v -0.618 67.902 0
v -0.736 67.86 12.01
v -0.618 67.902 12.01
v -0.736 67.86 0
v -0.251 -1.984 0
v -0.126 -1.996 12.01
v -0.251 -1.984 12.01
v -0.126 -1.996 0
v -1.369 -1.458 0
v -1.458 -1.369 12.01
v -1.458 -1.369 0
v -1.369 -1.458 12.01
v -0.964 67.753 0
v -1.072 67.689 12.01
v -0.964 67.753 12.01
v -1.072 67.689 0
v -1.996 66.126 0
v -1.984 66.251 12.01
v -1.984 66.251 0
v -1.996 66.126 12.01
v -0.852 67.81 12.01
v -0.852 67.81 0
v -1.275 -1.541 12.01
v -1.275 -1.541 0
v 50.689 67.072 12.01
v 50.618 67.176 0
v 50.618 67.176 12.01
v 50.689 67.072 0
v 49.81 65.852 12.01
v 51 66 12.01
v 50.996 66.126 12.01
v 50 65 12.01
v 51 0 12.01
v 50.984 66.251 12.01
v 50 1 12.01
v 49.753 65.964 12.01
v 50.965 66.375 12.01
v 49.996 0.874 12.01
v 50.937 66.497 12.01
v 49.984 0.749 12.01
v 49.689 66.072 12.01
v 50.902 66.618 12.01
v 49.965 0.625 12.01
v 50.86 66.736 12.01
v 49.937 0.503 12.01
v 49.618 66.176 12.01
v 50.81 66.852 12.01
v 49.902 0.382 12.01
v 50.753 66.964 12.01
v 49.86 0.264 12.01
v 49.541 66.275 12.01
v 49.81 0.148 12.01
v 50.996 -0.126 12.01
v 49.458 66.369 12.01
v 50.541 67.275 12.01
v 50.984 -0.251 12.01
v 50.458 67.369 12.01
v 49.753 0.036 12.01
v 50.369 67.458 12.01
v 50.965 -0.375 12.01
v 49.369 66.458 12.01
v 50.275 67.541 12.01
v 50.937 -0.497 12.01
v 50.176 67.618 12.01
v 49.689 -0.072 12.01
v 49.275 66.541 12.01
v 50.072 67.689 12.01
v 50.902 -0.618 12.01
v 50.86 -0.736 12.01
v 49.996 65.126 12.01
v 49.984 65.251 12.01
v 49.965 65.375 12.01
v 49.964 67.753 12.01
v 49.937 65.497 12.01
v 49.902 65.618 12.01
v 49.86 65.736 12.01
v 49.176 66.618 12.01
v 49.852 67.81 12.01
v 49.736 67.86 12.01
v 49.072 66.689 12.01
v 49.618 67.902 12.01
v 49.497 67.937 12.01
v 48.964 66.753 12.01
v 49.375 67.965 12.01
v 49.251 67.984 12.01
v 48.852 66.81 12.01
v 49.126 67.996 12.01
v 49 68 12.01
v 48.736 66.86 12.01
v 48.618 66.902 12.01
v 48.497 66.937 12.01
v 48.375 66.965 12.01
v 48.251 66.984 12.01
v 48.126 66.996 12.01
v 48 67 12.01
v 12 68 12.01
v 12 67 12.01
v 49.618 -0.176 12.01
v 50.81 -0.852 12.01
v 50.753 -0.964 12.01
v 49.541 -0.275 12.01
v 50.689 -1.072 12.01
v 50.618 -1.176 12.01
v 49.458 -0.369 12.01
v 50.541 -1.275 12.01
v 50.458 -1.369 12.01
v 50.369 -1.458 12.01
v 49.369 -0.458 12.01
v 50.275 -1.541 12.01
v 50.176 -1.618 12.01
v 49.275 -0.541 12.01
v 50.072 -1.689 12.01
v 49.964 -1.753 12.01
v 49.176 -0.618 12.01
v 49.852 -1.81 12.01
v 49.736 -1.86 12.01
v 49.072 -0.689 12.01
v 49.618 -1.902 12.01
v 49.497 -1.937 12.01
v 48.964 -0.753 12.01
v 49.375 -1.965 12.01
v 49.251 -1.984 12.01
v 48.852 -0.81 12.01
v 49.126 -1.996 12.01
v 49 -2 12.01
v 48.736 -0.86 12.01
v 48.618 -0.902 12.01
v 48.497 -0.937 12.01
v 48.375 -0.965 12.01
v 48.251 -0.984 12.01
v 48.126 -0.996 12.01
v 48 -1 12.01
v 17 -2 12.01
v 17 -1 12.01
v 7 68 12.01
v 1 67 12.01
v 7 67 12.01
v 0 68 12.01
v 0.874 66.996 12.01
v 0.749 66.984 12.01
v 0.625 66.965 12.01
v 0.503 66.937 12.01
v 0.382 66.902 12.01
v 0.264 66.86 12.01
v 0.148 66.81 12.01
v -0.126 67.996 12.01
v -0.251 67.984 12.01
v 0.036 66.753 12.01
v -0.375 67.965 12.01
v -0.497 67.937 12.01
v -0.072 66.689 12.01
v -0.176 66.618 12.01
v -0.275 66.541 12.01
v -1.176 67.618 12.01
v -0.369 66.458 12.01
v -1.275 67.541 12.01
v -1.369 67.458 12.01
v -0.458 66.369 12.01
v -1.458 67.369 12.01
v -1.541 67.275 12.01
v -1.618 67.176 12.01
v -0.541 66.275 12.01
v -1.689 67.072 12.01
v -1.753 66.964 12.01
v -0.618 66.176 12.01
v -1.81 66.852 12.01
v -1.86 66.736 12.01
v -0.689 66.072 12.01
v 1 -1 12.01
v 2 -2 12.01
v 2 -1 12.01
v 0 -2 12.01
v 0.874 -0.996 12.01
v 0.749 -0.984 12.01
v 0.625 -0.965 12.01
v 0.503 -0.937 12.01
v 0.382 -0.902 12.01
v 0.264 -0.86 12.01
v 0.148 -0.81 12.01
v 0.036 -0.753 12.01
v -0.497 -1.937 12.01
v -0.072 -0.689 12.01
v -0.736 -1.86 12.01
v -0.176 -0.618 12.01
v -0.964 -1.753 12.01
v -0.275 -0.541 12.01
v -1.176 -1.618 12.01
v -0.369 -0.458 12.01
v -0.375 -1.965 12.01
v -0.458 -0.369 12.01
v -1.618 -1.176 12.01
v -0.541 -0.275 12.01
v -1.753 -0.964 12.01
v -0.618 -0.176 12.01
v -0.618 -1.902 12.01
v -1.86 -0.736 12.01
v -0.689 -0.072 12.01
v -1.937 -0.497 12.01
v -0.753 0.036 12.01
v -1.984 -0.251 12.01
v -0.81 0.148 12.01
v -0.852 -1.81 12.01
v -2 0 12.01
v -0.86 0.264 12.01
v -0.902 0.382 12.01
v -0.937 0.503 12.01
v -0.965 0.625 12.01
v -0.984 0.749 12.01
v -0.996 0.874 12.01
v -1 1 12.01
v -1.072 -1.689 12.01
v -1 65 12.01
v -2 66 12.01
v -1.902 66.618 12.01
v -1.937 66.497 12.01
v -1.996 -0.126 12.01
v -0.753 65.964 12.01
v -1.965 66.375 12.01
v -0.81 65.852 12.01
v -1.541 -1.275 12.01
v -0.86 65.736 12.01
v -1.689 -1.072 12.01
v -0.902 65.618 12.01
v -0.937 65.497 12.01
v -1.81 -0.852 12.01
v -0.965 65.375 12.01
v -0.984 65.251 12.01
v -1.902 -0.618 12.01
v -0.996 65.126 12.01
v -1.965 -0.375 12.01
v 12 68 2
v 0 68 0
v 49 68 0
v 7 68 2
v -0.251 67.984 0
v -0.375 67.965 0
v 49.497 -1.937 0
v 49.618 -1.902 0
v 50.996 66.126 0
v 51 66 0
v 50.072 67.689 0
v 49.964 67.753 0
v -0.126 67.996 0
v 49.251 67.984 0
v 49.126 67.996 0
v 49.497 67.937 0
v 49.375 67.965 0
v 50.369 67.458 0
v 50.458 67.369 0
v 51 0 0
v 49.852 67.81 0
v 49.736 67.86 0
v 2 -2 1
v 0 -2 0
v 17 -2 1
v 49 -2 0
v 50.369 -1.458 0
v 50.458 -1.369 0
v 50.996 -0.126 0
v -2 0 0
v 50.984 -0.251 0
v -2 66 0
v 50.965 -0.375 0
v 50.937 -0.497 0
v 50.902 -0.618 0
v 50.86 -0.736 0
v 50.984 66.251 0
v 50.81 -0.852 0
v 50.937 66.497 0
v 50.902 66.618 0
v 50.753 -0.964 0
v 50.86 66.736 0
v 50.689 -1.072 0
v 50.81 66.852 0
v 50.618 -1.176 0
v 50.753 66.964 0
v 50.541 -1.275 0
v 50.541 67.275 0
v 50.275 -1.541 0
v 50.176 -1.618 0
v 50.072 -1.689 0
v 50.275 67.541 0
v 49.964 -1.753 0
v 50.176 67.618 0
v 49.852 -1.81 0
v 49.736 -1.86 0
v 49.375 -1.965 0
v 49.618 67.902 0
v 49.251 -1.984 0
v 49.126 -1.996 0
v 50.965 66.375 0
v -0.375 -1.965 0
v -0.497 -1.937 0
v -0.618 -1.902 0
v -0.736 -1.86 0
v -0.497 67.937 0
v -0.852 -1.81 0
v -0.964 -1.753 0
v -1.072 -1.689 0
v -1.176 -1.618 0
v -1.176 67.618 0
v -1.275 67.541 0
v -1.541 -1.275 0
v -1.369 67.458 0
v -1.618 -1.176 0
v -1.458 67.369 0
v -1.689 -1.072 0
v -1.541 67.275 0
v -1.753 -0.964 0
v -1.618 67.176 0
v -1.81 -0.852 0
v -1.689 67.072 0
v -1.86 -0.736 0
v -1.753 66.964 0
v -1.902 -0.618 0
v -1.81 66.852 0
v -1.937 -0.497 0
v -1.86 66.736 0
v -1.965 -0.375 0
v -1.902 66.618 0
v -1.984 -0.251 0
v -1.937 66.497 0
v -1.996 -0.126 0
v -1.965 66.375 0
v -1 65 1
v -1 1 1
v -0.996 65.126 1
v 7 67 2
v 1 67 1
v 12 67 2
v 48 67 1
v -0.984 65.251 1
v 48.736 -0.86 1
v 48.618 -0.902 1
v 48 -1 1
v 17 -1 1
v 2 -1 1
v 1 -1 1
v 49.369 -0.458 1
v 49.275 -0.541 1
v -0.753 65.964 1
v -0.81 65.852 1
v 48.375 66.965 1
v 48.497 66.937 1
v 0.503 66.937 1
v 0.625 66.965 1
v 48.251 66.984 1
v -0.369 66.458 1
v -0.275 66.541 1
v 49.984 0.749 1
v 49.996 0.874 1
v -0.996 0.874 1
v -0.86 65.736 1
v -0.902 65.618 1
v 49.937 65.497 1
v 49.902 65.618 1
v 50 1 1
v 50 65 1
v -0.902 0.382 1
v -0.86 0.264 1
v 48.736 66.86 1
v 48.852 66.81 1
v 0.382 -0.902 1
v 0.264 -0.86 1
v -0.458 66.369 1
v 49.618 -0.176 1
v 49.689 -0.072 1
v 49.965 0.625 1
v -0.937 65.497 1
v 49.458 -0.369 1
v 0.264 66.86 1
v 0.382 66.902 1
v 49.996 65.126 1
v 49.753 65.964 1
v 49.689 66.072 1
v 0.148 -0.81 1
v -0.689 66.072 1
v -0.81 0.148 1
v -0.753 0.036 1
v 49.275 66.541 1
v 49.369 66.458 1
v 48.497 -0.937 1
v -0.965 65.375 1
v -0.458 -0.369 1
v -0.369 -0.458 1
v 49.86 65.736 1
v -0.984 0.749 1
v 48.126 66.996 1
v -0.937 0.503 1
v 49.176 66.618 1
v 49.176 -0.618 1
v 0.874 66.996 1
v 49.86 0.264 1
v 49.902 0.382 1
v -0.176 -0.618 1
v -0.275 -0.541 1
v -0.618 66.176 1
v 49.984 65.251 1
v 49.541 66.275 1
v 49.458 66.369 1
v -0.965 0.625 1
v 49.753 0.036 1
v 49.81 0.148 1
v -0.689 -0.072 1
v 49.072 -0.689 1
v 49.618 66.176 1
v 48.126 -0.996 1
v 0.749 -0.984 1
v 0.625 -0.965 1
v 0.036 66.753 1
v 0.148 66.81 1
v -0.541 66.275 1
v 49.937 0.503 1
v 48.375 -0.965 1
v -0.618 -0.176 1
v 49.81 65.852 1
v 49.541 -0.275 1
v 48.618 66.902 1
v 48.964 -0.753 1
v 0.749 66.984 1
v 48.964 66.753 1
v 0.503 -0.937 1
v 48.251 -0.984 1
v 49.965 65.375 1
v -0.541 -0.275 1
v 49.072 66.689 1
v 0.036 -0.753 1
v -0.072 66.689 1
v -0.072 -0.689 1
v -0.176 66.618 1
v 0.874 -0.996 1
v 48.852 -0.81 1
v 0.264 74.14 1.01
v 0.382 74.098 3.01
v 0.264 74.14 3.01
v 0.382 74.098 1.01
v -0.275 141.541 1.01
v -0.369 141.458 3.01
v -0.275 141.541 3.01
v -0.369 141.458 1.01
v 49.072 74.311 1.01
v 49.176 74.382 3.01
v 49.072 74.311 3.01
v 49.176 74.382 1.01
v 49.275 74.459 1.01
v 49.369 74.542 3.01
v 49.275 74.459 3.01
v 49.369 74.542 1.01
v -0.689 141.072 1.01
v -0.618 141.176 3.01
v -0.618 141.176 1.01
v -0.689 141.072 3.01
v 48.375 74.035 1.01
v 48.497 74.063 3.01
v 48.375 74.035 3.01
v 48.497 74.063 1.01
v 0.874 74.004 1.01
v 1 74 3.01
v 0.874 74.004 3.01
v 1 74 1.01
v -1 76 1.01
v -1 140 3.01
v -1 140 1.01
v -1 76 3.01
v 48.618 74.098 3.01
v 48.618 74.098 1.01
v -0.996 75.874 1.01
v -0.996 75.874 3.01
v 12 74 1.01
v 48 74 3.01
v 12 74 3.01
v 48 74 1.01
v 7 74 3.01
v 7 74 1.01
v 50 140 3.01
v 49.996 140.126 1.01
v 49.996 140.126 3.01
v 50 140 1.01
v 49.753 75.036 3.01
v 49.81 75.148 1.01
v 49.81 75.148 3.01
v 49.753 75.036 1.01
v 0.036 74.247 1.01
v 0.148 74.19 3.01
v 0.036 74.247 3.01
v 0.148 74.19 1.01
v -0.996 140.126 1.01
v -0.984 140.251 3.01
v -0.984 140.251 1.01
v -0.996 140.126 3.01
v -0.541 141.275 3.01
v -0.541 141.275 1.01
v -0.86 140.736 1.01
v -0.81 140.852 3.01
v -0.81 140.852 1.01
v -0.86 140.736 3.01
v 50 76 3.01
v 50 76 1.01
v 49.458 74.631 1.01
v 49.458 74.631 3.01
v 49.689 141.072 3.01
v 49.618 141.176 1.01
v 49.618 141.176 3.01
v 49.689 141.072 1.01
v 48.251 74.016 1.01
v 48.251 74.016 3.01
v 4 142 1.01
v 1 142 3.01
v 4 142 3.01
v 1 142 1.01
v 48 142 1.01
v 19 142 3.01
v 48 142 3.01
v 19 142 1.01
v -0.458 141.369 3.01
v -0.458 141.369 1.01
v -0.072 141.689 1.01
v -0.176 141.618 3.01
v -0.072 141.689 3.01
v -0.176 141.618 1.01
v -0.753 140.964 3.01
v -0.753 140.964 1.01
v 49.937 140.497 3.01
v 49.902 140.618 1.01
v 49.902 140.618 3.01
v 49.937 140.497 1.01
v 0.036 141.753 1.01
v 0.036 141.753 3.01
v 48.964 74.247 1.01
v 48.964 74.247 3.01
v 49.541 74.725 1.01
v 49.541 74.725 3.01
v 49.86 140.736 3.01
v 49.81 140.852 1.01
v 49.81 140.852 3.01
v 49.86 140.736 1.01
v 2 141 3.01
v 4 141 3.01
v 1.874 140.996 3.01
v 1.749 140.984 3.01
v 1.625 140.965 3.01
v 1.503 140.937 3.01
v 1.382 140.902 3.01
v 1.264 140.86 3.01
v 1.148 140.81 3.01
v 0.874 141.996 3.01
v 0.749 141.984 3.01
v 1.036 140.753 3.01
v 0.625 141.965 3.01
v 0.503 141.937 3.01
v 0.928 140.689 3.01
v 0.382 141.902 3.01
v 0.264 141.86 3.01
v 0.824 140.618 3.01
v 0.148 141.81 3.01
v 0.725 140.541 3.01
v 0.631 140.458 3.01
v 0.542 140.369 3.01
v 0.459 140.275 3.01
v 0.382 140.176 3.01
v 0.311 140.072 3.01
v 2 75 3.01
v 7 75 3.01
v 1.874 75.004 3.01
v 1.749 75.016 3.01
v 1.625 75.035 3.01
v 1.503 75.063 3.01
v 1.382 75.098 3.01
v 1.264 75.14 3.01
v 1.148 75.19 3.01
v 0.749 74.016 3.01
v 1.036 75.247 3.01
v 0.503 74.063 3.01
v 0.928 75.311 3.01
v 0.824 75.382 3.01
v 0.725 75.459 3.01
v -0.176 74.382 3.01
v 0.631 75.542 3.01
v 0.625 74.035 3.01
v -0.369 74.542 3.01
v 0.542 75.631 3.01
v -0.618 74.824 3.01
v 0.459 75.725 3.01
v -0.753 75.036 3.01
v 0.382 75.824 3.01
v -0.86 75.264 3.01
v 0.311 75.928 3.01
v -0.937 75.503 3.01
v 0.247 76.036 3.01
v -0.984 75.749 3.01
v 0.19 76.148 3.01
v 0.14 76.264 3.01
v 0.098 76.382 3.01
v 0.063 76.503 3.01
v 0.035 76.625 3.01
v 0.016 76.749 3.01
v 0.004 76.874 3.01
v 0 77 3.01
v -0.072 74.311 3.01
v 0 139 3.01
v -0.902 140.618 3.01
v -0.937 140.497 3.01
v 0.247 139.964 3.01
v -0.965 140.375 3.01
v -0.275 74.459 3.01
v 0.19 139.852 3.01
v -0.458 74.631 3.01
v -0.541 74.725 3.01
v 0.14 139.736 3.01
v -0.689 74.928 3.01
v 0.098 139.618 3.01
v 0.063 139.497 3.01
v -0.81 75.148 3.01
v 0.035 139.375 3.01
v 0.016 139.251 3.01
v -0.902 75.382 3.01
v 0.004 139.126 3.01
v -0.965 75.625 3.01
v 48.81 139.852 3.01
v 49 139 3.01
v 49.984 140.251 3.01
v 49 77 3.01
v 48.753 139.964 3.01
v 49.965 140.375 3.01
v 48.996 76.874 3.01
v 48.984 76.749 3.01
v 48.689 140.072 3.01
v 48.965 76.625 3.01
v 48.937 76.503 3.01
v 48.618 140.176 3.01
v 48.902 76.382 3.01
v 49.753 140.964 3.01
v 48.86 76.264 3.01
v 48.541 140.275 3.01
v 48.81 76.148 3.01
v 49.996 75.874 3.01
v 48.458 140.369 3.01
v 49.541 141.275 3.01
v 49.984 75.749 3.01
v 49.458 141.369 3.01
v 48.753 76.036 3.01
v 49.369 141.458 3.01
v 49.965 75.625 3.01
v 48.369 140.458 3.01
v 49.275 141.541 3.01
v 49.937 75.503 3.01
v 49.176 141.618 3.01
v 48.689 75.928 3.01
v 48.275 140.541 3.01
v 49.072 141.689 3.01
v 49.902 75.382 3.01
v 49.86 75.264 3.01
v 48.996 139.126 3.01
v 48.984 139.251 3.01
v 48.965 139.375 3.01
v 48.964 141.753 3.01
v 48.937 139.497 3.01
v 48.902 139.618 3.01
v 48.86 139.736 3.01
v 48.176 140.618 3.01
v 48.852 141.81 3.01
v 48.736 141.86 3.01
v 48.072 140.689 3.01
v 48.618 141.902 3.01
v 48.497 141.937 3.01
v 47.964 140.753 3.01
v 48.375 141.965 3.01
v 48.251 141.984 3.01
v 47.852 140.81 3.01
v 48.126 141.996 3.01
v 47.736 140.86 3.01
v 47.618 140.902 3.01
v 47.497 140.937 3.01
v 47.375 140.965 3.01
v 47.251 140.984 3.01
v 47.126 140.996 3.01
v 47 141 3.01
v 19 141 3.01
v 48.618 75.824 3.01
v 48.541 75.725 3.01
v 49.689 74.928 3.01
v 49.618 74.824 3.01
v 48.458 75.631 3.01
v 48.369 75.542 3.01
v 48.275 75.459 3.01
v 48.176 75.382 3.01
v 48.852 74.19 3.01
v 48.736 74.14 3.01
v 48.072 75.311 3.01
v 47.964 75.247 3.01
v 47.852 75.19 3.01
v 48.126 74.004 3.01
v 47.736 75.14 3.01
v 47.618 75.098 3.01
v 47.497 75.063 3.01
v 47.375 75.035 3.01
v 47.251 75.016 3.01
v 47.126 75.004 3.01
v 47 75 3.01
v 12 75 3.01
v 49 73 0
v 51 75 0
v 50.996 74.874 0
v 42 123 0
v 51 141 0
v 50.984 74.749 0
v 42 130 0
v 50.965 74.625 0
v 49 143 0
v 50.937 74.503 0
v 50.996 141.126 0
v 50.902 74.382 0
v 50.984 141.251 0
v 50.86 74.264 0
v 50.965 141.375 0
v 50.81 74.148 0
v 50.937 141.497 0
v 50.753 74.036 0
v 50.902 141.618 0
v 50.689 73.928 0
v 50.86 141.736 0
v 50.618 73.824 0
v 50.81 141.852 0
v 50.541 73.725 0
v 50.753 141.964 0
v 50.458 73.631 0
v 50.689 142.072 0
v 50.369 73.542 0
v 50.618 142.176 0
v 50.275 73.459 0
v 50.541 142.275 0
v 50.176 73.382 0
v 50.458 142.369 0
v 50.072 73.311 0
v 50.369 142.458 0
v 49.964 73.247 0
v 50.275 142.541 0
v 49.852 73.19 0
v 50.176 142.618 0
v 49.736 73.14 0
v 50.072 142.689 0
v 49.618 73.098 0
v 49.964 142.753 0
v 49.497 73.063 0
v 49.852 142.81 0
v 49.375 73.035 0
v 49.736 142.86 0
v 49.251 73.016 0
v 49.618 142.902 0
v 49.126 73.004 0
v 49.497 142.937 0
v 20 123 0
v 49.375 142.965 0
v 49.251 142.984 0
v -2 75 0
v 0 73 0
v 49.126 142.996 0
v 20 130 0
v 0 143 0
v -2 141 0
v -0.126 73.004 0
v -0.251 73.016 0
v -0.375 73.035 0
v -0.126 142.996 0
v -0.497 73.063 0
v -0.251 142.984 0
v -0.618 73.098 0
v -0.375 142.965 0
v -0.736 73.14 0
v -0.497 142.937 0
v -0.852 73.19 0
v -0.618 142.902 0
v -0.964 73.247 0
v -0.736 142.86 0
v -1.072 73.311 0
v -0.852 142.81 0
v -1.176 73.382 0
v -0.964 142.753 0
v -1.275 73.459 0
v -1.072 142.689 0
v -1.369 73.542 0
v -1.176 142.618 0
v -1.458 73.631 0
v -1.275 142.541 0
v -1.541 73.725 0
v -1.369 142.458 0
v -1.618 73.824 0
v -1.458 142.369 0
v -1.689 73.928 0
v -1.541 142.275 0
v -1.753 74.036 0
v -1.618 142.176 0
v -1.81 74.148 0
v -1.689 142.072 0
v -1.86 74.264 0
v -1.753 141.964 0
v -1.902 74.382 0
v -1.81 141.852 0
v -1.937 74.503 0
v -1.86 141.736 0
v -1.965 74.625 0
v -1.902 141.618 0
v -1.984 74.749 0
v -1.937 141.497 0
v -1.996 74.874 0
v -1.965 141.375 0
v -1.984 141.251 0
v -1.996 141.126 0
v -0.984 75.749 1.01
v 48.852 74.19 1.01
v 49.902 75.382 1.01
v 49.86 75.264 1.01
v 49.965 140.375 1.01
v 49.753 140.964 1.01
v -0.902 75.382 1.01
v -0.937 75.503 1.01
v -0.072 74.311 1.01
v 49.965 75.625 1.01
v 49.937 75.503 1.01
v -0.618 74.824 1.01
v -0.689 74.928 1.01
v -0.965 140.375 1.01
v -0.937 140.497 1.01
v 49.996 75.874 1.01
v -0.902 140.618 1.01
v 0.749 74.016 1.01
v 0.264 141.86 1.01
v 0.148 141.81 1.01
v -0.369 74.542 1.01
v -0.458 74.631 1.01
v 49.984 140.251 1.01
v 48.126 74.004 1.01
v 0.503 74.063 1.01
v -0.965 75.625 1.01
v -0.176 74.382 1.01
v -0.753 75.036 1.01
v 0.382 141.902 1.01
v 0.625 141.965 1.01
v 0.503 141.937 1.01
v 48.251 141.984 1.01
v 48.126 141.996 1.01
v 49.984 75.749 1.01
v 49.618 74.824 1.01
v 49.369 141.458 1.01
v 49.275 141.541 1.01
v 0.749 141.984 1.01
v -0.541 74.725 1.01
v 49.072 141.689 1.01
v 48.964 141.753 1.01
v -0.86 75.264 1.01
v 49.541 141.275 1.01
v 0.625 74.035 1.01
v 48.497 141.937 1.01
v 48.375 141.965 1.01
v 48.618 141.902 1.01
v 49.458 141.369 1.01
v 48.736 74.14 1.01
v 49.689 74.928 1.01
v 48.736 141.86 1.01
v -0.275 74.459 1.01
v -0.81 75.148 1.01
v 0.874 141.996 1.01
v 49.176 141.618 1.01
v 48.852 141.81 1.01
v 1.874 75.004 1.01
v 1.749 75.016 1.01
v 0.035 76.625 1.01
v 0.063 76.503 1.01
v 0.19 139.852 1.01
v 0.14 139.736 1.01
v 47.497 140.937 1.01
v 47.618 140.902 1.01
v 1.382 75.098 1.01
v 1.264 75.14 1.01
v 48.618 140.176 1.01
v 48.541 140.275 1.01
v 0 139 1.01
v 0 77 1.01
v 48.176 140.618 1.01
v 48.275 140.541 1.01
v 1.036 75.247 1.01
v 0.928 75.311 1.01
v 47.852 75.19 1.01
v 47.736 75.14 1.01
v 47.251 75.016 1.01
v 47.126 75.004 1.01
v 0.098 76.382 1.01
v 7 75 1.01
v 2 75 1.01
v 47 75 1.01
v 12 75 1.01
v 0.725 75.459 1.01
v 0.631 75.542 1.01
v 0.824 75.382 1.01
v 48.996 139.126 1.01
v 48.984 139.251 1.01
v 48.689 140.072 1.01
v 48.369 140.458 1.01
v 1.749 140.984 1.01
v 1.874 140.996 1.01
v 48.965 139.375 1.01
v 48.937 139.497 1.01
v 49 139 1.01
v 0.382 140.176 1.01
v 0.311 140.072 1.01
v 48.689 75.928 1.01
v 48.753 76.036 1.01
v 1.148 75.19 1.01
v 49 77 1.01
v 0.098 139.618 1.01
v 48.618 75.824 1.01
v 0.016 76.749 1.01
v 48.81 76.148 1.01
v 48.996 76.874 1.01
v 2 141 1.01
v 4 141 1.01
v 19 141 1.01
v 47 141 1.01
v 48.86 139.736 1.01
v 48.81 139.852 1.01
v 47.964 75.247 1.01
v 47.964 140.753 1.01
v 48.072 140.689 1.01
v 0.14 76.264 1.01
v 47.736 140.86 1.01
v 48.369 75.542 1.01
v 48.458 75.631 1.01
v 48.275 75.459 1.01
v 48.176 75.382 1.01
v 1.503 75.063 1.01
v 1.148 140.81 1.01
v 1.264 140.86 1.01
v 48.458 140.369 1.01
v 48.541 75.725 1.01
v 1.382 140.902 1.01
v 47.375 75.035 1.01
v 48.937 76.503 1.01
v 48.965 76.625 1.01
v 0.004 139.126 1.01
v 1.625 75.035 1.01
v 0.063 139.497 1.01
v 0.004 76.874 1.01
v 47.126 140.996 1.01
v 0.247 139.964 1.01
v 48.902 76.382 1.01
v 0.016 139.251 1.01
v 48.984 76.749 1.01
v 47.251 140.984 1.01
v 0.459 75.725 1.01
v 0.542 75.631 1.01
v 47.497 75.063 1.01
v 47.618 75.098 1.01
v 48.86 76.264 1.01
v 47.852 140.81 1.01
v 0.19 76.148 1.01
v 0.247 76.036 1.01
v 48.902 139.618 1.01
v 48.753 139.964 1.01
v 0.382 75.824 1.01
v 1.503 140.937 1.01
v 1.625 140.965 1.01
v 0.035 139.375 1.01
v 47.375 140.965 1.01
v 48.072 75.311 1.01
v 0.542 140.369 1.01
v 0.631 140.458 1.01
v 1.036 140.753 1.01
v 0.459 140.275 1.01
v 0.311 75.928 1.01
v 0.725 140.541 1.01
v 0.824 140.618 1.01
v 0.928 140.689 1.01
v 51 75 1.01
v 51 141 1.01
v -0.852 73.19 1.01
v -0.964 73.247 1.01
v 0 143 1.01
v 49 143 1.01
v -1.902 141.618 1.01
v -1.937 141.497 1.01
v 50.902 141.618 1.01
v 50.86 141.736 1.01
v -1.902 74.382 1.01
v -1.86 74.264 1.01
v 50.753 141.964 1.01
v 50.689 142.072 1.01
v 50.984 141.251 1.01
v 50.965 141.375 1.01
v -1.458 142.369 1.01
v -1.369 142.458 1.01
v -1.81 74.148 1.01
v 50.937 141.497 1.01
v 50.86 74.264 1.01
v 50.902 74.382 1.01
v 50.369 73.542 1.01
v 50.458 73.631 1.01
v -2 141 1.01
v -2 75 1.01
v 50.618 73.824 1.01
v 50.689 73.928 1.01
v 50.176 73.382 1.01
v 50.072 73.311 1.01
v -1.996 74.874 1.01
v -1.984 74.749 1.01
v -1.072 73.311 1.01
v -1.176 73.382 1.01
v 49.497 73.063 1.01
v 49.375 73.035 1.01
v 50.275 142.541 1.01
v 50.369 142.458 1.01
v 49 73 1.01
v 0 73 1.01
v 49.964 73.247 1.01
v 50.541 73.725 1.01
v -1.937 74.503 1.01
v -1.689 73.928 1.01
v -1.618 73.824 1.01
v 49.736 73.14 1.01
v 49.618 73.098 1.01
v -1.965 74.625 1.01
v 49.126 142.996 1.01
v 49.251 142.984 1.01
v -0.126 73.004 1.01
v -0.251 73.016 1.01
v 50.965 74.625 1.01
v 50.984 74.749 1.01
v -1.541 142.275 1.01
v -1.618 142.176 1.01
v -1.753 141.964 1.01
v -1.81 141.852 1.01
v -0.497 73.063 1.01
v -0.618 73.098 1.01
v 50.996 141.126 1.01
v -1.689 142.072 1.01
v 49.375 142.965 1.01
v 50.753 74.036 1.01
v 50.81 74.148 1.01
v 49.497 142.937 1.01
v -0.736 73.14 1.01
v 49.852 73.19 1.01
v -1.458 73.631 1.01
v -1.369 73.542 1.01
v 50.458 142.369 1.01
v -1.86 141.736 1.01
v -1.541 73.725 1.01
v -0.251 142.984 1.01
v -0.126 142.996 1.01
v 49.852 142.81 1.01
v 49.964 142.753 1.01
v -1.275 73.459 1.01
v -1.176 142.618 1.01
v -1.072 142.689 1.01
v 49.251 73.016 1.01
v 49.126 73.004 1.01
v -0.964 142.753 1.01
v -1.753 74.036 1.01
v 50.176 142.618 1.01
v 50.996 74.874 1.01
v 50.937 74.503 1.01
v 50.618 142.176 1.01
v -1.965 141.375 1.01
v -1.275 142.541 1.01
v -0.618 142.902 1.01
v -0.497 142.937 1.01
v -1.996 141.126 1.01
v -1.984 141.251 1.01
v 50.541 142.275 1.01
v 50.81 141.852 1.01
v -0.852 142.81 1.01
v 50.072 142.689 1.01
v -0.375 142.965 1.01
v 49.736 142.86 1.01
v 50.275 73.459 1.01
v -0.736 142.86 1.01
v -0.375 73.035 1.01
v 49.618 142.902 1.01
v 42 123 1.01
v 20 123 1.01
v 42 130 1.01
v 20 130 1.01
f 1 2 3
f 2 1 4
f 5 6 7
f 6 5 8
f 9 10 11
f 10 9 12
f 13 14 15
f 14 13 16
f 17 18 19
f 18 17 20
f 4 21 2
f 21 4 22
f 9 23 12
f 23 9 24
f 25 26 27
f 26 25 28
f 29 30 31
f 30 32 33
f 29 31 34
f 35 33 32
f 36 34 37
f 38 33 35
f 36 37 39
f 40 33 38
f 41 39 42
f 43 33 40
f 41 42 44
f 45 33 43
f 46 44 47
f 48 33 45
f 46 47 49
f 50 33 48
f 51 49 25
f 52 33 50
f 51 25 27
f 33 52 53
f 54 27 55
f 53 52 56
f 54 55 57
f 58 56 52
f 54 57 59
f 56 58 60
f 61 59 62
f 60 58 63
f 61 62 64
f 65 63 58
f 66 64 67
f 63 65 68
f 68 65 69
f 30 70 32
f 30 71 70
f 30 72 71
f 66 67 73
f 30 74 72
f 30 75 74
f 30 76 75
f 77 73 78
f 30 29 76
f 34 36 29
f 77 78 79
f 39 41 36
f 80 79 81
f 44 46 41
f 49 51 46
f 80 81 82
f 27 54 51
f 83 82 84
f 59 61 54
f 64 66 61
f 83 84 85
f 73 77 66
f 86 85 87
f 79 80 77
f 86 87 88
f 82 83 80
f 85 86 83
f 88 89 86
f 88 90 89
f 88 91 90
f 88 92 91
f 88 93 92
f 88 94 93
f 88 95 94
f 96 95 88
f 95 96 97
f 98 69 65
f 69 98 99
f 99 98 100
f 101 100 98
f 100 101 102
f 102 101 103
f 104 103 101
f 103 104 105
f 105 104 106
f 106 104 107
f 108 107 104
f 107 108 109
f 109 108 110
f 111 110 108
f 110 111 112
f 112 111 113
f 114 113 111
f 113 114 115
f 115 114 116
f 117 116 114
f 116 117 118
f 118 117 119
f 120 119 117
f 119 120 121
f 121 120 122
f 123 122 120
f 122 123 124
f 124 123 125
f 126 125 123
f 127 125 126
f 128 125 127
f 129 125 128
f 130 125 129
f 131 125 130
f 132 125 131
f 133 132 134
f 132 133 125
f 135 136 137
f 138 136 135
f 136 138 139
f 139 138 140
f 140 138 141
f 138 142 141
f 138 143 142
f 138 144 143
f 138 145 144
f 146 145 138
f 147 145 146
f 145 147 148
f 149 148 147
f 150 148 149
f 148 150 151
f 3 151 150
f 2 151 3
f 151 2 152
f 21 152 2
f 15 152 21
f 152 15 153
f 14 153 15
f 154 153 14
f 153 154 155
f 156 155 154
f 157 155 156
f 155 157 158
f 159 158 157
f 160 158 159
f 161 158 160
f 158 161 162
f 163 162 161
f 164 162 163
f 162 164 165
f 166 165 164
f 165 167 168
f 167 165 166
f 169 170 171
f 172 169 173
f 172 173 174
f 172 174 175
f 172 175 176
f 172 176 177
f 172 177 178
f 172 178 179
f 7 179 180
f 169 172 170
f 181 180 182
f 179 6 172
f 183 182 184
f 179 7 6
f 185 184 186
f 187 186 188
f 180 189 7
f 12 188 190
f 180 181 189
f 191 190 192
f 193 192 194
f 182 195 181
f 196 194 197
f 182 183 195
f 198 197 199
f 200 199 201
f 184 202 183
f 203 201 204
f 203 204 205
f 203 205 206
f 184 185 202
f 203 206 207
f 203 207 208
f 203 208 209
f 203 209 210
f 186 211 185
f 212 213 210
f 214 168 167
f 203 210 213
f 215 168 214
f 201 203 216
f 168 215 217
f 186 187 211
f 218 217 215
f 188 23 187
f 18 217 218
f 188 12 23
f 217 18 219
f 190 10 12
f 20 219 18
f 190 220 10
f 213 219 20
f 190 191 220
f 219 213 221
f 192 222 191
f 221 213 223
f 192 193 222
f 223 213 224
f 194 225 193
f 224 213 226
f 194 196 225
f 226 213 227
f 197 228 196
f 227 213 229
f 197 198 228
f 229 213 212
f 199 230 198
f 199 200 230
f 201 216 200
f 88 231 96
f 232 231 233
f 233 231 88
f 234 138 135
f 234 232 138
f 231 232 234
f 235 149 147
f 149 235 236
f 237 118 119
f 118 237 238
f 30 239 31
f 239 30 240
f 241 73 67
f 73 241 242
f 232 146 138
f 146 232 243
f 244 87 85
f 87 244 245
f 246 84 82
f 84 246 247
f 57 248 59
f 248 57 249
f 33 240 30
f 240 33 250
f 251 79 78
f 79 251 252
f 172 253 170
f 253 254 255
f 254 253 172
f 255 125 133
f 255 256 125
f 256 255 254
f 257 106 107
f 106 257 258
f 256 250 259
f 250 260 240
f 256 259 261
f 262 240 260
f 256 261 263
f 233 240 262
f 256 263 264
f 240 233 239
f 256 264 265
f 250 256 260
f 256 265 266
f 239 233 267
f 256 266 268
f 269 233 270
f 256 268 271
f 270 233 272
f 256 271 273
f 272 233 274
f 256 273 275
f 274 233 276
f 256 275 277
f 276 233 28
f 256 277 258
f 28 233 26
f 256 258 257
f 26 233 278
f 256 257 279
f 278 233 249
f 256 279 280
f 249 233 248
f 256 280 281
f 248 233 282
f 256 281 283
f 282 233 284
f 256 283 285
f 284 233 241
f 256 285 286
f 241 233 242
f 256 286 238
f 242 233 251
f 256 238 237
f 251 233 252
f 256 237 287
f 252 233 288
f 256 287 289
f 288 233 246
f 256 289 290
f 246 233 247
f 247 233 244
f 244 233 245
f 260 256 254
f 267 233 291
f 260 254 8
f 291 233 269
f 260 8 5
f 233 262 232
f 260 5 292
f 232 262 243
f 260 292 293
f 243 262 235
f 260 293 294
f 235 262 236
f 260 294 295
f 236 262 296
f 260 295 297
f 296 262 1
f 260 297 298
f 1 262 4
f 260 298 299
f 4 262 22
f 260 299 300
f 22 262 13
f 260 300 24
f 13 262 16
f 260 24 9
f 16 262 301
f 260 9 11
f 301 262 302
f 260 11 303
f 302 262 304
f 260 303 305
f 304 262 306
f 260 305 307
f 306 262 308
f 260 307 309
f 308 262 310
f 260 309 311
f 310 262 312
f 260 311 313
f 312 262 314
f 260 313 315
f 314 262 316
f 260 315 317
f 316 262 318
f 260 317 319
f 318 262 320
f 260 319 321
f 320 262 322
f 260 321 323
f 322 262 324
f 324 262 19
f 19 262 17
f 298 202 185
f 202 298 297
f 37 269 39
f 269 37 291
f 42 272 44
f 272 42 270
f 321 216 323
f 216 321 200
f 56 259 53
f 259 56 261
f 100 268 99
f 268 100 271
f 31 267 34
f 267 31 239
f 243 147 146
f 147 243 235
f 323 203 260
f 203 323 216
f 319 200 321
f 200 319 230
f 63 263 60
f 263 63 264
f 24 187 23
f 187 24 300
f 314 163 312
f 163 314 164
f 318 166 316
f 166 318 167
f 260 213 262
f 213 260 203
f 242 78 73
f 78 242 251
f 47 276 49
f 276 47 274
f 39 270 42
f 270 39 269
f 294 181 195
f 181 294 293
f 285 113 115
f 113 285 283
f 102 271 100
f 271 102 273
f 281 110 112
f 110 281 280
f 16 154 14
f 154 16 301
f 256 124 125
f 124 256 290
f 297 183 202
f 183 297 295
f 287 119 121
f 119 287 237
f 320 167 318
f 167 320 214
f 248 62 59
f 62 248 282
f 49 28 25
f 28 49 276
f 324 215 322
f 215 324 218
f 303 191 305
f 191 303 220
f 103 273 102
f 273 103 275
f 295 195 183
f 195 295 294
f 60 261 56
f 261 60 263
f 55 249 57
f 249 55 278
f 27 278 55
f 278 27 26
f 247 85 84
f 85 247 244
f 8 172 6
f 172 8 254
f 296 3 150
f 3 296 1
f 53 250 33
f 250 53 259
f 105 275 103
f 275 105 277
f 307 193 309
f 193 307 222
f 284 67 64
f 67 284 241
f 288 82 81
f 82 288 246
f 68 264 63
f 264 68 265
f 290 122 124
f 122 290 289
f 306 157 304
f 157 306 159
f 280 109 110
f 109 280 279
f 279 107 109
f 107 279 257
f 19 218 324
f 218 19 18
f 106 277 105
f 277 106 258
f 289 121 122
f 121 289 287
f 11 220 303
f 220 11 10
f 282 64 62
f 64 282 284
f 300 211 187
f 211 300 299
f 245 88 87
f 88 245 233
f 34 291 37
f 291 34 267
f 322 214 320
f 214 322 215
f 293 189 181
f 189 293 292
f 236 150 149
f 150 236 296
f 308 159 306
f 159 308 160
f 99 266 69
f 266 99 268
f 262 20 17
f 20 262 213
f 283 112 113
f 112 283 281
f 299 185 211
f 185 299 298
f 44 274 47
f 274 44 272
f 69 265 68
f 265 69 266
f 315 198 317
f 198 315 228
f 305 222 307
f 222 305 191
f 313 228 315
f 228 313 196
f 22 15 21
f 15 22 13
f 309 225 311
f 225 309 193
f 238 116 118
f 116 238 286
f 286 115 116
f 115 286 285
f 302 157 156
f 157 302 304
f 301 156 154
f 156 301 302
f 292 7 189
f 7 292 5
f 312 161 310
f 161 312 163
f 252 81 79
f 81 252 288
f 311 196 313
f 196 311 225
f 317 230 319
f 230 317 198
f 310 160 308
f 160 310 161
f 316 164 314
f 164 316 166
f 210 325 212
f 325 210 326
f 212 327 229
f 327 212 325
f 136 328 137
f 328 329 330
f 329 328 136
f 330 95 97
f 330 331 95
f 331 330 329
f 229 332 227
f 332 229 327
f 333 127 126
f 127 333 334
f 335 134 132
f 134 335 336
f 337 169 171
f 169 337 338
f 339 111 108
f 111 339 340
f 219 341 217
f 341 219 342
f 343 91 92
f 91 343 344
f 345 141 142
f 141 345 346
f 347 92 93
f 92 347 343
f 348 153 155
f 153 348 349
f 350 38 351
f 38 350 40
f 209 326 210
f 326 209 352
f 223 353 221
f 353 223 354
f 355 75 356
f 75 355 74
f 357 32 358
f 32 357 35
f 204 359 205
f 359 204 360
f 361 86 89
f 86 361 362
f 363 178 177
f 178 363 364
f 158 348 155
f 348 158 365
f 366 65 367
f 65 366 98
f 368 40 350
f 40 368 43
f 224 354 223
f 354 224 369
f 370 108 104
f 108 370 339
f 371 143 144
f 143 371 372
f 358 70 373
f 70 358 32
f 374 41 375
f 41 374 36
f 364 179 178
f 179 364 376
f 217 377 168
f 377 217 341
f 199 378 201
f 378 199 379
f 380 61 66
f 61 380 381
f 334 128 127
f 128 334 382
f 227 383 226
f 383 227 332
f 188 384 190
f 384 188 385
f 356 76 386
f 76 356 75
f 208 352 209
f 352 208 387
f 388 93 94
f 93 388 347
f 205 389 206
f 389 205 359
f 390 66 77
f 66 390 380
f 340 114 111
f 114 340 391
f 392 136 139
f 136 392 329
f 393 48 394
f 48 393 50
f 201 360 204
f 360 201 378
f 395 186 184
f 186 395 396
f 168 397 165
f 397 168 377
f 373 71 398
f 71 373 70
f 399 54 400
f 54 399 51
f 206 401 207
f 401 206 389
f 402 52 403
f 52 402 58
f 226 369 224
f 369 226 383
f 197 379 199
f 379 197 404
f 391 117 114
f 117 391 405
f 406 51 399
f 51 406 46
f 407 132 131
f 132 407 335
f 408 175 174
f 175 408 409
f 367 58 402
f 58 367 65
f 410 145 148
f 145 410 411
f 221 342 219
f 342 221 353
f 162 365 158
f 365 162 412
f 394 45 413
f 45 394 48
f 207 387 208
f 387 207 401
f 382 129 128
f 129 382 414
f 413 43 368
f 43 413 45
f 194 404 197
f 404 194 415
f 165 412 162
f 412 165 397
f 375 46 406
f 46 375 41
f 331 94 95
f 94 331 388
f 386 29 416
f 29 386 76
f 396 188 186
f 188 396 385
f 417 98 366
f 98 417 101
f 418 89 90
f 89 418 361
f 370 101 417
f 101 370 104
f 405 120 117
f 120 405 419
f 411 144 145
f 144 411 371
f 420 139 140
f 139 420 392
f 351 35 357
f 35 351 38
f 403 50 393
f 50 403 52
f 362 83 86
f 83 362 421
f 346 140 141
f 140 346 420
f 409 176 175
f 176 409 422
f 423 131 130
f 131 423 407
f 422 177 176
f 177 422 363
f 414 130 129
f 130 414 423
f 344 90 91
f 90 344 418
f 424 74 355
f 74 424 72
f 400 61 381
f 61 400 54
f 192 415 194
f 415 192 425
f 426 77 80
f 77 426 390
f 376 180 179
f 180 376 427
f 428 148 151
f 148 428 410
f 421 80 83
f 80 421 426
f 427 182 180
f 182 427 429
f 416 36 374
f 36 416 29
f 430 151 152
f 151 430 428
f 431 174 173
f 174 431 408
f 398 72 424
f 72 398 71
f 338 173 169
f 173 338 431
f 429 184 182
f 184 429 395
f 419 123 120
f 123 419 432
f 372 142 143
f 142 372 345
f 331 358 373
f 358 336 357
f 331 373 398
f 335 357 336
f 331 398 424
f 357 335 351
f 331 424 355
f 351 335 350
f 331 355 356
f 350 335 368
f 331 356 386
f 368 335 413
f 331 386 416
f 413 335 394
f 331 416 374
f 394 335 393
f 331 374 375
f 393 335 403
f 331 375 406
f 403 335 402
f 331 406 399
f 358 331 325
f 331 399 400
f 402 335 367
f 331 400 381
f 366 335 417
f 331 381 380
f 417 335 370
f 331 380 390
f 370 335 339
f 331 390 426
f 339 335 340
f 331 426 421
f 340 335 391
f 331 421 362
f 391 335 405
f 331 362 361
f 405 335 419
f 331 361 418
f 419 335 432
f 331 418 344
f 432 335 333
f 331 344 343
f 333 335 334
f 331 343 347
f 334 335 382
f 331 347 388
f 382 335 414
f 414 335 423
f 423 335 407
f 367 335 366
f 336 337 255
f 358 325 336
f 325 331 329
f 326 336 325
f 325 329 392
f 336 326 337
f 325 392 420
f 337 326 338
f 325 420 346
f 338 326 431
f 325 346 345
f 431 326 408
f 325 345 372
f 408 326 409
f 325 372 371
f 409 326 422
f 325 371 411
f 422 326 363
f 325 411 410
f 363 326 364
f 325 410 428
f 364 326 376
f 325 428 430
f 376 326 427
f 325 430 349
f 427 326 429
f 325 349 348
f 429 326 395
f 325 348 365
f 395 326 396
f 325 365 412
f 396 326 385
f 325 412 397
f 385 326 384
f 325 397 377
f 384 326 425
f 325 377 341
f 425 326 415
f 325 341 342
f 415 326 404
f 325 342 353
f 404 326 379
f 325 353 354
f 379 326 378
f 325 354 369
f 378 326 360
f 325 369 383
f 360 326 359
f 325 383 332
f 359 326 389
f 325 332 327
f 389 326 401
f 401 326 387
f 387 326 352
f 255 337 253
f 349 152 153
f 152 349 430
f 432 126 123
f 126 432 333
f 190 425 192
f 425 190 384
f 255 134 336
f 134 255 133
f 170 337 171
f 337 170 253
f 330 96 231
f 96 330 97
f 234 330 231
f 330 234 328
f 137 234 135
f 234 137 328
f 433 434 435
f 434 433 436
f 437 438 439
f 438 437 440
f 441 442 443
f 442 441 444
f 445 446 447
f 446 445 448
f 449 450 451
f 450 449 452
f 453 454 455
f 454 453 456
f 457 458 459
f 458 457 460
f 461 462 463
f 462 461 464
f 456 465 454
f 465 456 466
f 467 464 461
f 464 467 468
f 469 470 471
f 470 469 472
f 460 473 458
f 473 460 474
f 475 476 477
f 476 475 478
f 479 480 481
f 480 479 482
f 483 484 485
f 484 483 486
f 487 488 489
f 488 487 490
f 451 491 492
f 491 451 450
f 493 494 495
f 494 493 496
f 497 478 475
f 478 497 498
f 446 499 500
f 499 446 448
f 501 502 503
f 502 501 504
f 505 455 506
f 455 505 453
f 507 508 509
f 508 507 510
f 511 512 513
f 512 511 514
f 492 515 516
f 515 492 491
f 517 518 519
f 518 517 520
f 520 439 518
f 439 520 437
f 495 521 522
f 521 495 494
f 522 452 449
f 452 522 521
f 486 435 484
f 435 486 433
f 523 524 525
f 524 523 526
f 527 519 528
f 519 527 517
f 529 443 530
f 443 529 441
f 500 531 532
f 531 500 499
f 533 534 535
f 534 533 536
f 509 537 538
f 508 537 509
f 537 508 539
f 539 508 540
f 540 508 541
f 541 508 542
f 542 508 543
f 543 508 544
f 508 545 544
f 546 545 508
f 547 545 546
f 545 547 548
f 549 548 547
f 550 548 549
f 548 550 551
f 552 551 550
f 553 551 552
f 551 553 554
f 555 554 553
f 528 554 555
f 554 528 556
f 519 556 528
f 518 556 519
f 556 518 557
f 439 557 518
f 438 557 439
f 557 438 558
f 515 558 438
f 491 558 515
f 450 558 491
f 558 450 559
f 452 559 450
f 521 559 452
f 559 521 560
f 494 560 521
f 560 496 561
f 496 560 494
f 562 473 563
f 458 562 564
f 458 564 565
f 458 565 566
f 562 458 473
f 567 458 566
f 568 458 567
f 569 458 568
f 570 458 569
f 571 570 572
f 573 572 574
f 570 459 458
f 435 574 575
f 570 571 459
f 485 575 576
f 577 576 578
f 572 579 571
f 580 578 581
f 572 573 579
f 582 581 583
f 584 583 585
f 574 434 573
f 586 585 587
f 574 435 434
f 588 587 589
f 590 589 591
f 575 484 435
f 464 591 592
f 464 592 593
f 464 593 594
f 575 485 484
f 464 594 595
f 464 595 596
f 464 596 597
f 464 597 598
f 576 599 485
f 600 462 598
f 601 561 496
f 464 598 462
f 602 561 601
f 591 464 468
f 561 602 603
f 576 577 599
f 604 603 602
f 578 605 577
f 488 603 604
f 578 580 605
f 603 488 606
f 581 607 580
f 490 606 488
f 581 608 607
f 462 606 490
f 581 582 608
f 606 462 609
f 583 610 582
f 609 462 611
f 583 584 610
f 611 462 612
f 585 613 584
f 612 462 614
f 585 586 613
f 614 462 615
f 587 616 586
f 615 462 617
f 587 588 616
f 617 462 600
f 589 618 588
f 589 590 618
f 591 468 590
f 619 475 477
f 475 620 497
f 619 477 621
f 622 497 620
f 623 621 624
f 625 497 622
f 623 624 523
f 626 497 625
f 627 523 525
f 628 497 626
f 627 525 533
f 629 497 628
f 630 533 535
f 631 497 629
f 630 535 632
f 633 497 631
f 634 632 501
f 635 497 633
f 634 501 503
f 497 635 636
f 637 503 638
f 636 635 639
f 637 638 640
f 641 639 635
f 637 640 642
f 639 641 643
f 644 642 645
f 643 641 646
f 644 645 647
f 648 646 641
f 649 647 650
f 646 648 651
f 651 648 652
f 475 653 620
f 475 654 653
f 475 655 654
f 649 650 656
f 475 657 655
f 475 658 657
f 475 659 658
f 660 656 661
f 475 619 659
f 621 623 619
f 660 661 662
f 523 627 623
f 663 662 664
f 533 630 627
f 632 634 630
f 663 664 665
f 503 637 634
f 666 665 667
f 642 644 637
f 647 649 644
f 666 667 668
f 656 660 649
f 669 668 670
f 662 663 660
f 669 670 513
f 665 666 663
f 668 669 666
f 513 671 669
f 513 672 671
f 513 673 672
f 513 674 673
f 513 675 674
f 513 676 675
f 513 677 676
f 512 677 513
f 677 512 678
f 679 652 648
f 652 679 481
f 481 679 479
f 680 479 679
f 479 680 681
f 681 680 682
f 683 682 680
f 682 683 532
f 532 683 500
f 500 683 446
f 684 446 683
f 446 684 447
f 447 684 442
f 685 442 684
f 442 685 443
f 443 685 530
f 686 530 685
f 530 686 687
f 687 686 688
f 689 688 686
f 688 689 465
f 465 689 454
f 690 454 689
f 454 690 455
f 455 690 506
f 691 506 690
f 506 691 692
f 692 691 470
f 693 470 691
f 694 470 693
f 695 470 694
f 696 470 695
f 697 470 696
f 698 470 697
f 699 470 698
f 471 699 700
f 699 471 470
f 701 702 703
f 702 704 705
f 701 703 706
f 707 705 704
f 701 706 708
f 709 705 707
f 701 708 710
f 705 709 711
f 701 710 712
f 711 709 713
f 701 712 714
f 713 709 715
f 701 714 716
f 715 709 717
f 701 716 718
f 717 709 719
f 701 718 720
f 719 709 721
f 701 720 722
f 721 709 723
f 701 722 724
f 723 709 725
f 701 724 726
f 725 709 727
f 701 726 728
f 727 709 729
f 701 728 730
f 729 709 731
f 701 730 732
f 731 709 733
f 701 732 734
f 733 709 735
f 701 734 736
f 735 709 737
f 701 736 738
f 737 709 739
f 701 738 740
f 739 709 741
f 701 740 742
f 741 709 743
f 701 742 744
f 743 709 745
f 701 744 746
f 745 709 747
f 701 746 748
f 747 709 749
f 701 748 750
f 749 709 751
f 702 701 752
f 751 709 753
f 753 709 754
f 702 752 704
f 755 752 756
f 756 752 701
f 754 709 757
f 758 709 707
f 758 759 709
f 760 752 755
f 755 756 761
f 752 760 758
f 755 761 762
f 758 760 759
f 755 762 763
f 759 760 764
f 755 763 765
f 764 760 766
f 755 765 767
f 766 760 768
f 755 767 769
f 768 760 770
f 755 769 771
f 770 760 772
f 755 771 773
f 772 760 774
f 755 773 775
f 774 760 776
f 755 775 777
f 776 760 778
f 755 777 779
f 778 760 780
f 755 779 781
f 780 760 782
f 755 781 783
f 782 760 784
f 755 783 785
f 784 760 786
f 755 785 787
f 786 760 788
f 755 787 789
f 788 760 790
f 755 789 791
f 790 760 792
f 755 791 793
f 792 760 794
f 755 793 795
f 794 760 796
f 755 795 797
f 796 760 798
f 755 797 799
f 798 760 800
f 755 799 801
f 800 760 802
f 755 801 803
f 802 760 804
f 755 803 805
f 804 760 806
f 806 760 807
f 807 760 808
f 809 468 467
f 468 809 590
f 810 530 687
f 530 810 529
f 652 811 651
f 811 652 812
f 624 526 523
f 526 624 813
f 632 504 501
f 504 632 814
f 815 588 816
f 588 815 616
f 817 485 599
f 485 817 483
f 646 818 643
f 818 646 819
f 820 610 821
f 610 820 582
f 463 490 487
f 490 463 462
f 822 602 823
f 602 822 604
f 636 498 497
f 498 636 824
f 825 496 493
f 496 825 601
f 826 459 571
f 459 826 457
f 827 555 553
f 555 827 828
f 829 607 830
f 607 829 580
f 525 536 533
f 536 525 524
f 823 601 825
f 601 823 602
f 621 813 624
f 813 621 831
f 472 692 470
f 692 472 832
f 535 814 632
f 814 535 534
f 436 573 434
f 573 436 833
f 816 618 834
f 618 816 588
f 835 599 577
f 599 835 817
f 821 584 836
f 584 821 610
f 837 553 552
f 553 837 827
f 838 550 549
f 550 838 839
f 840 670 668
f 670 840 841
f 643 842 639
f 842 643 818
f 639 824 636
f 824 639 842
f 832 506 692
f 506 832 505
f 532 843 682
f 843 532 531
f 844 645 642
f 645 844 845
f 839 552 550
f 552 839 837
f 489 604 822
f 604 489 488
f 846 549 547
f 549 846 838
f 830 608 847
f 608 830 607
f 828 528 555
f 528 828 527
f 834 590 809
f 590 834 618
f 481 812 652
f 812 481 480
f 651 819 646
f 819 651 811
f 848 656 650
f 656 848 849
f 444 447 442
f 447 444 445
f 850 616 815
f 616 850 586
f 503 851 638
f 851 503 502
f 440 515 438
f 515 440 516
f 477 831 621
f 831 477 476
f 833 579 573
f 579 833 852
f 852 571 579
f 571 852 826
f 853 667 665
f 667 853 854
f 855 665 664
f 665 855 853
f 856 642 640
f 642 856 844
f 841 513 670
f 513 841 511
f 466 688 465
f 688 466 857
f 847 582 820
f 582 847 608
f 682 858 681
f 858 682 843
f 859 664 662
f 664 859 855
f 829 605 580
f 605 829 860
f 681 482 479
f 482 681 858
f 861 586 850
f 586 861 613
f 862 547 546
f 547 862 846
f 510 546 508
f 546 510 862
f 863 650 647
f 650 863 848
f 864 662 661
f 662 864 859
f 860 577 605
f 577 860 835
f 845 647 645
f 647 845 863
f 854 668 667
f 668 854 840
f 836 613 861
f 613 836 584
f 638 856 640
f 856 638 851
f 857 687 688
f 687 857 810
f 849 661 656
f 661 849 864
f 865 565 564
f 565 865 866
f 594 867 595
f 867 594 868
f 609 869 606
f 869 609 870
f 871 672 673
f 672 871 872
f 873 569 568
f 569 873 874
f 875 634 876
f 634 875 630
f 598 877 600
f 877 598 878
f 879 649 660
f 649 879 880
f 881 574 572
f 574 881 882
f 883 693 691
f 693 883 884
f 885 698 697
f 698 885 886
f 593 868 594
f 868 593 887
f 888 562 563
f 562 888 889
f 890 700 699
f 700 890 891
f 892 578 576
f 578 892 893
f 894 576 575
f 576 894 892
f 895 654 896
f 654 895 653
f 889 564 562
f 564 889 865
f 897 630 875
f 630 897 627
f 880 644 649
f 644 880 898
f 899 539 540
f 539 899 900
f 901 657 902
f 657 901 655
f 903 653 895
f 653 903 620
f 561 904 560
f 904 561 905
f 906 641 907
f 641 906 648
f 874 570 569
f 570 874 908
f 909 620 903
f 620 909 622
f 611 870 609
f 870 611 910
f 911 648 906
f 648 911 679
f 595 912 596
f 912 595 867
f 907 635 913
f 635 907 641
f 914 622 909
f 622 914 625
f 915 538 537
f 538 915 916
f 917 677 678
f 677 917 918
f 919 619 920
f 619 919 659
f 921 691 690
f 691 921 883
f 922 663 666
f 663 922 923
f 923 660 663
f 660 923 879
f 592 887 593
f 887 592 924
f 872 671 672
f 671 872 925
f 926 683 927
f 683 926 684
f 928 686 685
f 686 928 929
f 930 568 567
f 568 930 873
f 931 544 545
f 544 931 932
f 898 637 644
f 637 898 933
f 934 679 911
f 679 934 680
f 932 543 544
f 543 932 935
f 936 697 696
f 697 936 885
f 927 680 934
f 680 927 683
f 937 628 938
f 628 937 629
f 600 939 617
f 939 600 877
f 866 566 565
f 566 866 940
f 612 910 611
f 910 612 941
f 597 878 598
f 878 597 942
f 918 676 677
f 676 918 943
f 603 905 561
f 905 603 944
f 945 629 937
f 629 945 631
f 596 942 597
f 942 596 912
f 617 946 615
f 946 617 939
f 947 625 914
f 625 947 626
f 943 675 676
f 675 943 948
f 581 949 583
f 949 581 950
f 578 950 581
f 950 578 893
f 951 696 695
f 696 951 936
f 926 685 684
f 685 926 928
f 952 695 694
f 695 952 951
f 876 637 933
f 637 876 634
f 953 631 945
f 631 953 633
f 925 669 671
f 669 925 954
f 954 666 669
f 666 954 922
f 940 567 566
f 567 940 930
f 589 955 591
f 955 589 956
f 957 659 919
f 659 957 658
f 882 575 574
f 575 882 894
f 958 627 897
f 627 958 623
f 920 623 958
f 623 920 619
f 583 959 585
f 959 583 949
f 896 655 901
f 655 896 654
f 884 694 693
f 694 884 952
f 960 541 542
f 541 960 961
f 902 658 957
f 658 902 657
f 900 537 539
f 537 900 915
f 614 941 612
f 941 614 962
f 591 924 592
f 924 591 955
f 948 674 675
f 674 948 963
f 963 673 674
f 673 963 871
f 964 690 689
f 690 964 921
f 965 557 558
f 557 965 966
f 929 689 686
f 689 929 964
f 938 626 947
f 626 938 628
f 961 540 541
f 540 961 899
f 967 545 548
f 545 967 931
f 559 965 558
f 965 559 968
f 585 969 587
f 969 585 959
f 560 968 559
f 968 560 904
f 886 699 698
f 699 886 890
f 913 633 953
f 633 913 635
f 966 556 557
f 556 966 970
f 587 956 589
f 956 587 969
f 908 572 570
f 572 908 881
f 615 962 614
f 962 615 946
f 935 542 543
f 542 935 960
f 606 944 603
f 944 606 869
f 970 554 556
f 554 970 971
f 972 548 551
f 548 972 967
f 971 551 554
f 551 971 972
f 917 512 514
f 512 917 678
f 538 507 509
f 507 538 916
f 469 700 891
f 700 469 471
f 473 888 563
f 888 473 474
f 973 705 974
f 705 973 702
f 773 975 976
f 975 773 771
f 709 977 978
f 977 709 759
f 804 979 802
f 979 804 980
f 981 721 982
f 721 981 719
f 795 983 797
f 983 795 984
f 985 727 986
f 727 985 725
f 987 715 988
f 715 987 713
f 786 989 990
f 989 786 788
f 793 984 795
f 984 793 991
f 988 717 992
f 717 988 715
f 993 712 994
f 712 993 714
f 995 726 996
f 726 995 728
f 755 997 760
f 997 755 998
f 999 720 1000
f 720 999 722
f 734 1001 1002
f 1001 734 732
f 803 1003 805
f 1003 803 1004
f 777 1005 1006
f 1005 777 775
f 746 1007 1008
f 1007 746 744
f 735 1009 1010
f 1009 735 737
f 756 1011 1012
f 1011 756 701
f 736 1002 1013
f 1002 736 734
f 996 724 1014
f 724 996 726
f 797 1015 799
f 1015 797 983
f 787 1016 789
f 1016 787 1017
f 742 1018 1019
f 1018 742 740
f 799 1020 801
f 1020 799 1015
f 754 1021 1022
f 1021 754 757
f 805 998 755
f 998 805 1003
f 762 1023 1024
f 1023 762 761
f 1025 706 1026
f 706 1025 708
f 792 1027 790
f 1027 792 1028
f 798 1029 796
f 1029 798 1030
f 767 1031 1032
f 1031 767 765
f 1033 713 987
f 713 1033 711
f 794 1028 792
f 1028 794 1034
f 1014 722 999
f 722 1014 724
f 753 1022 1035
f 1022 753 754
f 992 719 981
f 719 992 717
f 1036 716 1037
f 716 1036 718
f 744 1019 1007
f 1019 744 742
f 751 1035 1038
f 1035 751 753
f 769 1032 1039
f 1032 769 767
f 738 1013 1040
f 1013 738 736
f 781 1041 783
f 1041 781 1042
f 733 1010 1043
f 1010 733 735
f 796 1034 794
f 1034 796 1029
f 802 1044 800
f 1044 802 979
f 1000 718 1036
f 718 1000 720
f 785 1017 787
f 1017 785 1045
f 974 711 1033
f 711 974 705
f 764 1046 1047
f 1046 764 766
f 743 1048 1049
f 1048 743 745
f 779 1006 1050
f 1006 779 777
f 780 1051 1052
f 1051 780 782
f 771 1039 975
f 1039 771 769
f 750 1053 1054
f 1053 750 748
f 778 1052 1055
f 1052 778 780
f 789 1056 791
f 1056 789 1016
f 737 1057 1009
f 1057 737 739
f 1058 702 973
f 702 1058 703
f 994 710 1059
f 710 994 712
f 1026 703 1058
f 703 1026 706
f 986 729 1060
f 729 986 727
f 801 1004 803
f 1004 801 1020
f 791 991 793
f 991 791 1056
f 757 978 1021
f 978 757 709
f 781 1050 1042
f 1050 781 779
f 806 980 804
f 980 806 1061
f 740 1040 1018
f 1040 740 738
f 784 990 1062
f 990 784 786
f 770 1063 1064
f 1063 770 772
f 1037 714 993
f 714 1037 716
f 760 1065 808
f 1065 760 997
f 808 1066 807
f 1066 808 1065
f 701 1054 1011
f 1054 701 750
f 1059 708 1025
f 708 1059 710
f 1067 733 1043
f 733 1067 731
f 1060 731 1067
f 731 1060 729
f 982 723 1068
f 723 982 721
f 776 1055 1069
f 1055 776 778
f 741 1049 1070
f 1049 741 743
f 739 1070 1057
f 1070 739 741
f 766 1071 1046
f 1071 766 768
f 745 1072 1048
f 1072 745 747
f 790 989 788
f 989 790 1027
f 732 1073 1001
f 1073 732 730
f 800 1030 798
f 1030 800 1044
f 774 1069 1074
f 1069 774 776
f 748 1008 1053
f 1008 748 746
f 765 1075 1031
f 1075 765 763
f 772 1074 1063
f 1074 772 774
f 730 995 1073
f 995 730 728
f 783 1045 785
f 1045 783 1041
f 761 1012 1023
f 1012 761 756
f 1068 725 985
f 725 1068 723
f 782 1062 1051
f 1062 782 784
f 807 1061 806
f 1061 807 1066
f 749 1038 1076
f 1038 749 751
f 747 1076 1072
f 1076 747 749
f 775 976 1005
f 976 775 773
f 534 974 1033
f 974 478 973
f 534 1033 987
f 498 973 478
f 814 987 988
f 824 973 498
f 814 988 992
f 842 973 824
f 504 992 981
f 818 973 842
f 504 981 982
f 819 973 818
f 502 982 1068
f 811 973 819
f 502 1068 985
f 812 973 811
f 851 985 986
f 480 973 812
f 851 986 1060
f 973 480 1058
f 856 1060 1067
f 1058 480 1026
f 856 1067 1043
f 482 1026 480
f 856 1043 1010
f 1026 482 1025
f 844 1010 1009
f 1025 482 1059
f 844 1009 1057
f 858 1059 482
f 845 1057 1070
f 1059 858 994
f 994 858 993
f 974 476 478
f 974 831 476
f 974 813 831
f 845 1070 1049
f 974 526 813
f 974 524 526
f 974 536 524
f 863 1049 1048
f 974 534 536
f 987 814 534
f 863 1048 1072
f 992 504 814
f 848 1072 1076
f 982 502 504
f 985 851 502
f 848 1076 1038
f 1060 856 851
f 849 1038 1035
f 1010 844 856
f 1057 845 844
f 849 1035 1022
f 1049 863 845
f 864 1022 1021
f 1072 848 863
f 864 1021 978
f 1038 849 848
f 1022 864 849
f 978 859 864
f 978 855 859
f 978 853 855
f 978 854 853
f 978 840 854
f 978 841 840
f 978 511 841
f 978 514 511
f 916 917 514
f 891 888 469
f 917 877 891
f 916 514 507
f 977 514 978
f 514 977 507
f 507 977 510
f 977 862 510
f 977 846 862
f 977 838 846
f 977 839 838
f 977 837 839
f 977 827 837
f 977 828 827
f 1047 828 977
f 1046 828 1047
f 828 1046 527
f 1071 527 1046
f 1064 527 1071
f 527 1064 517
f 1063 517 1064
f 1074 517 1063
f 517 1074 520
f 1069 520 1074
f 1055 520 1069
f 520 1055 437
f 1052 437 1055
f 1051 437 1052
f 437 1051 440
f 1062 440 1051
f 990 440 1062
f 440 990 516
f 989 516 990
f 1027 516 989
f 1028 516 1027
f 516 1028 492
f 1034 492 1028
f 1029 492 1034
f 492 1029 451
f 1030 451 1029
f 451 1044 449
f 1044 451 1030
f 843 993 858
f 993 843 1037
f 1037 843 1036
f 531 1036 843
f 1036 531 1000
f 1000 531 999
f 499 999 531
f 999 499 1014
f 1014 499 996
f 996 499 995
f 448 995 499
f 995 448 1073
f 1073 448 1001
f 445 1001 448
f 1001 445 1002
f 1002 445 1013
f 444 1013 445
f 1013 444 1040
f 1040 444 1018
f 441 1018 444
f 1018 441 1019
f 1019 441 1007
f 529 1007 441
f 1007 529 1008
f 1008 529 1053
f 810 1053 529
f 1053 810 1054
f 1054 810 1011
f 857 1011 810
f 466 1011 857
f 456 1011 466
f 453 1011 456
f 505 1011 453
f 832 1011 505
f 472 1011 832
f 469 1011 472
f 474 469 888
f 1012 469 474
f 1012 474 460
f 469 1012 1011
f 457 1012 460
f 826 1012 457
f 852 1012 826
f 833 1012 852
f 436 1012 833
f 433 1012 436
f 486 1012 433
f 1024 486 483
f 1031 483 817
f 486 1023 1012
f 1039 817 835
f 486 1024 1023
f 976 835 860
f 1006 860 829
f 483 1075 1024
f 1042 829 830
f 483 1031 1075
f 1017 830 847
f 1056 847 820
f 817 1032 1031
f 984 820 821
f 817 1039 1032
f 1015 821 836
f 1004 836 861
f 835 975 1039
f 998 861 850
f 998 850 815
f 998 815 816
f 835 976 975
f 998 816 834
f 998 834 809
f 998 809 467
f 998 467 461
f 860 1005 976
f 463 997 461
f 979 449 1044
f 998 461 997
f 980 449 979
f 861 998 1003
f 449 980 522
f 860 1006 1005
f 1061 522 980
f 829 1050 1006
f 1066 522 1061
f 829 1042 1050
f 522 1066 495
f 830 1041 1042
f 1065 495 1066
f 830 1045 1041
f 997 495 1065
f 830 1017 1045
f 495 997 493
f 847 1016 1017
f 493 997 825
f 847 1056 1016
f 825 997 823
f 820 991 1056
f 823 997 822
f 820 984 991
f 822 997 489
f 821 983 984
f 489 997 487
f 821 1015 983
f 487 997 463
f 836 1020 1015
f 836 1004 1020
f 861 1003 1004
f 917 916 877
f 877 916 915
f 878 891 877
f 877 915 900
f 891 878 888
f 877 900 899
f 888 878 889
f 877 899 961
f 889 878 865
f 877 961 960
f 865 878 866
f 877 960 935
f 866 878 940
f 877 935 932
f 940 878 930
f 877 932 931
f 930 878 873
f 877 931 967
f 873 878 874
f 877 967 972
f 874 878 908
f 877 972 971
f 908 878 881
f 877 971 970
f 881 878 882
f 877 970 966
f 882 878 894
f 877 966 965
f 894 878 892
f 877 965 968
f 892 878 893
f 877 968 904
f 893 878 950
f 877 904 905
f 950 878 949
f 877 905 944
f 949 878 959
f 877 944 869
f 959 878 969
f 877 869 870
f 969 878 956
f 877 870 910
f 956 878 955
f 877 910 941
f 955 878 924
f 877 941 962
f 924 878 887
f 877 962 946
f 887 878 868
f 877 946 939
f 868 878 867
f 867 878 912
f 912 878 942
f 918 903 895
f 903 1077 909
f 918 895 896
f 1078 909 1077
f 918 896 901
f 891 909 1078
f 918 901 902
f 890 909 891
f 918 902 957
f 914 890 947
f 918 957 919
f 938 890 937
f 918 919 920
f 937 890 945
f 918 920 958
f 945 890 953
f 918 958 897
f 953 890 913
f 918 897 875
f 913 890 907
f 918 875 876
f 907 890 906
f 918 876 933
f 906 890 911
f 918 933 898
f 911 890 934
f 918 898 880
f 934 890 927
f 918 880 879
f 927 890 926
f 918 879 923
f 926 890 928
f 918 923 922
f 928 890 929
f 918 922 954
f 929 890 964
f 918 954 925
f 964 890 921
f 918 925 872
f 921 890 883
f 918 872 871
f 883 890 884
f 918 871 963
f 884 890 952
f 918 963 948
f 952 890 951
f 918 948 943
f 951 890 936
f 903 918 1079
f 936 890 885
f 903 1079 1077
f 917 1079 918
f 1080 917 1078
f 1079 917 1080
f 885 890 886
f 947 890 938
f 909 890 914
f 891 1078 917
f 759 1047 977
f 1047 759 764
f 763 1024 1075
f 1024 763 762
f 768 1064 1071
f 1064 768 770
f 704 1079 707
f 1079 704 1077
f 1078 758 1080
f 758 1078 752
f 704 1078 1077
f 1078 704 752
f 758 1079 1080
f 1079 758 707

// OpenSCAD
// upgrade resolution
$fn = 100;

// dimensions
length = 68;
width = 51;
height = 10;
cornerRadius = 2;
rimHeight = 2;
lidHeight = 1;

// rounded hollow box
difference() {
    roundedBox(length+2, width+2, height+2, cornerRadius);
    translate([1,1,1]) roundedBox(length, width, height+2, cornerRadius);

    // usb+wire holes
    translate([2,-3,1]) cube([15,3,height+2]);
    translate([7,length-2,2]) cube([5,3,height+1]);
}

// lid
translate([0, length*2+5, 0]) {
    mirror([0,1,0]) {
        difference() {
            union() {
                roundedBox(length+2, width+2, 1, cornerRadius);
                difference() {
                    // rim on lid
                    translate([1,1,0]) roundedBox(length,width,lidHeight+rimHeight,cornerRadius);
                    translate([2,2,1]) roundedBox(length-2,width-2,lidHeight+rimHeight,cornerRadius);
                

                    // usb+wire+jumper holes
                    translate([4,-2,1]) cube([15,3,lidHeight+rimHeight+1]);
                    translate([7,length-3,1]) cube([5,4,lidHeight+rimHeight+1]);
                }
            }
            
            // jumper hole
            translate([20,11,-2]) cube([22,7,7]);
        }
        
    }
}

// functions
module roundedBox(length, width, height, radius)
{
    dRadius = 2*radius;
    minkowski() {
        cube(size=[width-dRadius,length-dRadius, height]);
        cylinder(r=radius, h=0.01);
    }
}
